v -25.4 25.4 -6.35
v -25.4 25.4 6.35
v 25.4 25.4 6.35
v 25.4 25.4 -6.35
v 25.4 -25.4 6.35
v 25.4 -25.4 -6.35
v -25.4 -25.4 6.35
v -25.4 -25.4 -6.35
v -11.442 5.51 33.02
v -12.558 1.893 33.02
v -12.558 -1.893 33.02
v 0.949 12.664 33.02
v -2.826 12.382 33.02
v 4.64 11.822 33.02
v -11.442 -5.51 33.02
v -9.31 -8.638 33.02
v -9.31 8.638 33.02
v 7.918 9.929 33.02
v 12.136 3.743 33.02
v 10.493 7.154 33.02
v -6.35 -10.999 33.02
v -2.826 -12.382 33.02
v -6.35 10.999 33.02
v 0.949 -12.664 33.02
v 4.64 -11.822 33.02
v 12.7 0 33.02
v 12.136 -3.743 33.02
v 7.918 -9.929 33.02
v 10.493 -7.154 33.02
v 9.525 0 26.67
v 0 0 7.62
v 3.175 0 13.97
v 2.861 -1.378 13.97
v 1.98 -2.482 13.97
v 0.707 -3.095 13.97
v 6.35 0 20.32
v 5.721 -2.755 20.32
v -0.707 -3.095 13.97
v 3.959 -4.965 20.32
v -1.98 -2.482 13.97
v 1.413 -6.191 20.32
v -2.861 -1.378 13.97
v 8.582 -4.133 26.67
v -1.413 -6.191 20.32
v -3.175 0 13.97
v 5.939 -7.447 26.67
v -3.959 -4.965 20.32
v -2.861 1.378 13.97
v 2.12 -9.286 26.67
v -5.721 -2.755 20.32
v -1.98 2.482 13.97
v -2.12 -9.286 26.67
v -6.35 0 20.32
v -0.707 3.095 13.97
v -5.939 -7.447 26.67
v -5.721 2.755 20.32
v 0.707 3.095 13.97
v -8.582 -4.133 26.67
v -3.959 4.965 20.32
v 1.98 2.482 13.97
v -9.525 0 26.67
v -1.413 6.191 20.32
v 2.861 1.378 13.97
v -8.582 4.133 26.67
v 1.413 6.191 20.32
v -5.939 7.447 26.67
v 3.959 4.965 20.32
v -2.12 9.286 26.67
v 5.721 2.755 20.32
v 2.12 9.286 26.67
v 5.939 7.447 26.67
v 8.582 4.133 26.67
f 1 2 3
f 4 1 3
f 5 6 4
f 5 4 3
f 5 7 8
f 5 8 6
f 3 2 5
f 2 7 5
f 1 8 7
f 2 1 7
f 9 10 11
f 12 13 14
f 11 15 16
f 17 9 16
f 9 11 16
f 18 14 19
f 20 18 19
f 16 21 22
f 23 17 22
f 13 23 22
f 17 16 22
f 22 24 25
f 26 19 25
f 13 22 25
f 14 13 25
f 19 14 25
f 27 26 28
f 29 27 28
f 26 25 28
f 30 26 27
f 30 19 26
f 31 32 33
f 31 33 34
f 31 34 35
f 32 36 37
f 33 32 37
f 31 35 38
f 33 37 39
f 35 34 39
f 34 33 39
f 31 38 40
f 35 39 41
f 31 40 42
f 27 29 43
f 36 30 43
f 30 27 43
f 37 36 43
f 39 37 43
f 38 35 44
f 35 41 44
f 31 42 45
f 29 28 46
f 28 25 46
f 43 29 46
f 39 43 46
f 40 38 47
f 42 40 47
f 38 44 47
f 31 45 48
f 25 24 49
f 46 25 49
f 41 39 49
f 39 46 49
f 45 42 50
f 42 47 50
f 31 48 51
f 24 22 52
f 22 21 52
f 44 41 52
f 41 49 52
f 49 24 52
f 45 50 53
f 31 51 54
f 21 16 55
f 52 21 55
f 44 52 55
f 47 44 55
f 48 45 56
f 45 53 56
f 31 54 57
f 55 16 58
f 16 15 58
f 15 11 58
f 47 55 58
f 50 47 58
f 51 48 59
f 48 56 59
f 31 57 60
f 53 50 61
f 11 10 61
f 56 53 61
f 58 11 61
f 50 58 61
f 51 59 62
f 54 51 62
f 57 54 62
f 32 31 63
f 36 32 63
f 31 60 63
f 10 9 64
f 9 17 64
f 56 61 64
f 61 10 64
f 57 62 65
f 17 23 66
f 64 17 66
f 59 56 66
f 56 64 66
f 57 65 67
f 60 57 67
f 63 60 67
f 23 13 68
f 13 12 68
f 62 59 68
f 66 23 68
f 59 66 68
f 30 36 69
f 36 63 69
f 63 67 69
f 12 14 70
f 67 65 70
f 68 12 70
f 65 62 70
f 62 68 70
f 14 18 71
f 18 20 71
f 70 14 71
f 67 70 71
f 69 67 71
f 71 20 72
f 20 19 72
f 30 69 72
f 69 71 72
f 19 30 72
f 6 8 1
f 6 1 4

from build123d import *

# Parameters (mm, degrees)
F0_W     = 50.8
F0_H     = 12.7
F1_DEPTH = 25.4


with BuildPart() as f1:
    # F0 (on Front) → F1 (new body, symmetric)
    with BuildSketch(Plane.XZ):
        Rectangle(F0_W, F0_H)
    extrude(amount=F1_DEPTH, both=True)


with BuildPart() as f3:
    # F2 (on Front) → F3 (revolve)
    with BuildSketch(Plane.XZ):
        Polygon((0, 33.02), (0, 7.62), (12.7, 33.02), align=None)
    revolve(axis=Axis((0, 0, 20.32), (0, 0, -1)))


solid = Compound([f1.part, f3.part])
